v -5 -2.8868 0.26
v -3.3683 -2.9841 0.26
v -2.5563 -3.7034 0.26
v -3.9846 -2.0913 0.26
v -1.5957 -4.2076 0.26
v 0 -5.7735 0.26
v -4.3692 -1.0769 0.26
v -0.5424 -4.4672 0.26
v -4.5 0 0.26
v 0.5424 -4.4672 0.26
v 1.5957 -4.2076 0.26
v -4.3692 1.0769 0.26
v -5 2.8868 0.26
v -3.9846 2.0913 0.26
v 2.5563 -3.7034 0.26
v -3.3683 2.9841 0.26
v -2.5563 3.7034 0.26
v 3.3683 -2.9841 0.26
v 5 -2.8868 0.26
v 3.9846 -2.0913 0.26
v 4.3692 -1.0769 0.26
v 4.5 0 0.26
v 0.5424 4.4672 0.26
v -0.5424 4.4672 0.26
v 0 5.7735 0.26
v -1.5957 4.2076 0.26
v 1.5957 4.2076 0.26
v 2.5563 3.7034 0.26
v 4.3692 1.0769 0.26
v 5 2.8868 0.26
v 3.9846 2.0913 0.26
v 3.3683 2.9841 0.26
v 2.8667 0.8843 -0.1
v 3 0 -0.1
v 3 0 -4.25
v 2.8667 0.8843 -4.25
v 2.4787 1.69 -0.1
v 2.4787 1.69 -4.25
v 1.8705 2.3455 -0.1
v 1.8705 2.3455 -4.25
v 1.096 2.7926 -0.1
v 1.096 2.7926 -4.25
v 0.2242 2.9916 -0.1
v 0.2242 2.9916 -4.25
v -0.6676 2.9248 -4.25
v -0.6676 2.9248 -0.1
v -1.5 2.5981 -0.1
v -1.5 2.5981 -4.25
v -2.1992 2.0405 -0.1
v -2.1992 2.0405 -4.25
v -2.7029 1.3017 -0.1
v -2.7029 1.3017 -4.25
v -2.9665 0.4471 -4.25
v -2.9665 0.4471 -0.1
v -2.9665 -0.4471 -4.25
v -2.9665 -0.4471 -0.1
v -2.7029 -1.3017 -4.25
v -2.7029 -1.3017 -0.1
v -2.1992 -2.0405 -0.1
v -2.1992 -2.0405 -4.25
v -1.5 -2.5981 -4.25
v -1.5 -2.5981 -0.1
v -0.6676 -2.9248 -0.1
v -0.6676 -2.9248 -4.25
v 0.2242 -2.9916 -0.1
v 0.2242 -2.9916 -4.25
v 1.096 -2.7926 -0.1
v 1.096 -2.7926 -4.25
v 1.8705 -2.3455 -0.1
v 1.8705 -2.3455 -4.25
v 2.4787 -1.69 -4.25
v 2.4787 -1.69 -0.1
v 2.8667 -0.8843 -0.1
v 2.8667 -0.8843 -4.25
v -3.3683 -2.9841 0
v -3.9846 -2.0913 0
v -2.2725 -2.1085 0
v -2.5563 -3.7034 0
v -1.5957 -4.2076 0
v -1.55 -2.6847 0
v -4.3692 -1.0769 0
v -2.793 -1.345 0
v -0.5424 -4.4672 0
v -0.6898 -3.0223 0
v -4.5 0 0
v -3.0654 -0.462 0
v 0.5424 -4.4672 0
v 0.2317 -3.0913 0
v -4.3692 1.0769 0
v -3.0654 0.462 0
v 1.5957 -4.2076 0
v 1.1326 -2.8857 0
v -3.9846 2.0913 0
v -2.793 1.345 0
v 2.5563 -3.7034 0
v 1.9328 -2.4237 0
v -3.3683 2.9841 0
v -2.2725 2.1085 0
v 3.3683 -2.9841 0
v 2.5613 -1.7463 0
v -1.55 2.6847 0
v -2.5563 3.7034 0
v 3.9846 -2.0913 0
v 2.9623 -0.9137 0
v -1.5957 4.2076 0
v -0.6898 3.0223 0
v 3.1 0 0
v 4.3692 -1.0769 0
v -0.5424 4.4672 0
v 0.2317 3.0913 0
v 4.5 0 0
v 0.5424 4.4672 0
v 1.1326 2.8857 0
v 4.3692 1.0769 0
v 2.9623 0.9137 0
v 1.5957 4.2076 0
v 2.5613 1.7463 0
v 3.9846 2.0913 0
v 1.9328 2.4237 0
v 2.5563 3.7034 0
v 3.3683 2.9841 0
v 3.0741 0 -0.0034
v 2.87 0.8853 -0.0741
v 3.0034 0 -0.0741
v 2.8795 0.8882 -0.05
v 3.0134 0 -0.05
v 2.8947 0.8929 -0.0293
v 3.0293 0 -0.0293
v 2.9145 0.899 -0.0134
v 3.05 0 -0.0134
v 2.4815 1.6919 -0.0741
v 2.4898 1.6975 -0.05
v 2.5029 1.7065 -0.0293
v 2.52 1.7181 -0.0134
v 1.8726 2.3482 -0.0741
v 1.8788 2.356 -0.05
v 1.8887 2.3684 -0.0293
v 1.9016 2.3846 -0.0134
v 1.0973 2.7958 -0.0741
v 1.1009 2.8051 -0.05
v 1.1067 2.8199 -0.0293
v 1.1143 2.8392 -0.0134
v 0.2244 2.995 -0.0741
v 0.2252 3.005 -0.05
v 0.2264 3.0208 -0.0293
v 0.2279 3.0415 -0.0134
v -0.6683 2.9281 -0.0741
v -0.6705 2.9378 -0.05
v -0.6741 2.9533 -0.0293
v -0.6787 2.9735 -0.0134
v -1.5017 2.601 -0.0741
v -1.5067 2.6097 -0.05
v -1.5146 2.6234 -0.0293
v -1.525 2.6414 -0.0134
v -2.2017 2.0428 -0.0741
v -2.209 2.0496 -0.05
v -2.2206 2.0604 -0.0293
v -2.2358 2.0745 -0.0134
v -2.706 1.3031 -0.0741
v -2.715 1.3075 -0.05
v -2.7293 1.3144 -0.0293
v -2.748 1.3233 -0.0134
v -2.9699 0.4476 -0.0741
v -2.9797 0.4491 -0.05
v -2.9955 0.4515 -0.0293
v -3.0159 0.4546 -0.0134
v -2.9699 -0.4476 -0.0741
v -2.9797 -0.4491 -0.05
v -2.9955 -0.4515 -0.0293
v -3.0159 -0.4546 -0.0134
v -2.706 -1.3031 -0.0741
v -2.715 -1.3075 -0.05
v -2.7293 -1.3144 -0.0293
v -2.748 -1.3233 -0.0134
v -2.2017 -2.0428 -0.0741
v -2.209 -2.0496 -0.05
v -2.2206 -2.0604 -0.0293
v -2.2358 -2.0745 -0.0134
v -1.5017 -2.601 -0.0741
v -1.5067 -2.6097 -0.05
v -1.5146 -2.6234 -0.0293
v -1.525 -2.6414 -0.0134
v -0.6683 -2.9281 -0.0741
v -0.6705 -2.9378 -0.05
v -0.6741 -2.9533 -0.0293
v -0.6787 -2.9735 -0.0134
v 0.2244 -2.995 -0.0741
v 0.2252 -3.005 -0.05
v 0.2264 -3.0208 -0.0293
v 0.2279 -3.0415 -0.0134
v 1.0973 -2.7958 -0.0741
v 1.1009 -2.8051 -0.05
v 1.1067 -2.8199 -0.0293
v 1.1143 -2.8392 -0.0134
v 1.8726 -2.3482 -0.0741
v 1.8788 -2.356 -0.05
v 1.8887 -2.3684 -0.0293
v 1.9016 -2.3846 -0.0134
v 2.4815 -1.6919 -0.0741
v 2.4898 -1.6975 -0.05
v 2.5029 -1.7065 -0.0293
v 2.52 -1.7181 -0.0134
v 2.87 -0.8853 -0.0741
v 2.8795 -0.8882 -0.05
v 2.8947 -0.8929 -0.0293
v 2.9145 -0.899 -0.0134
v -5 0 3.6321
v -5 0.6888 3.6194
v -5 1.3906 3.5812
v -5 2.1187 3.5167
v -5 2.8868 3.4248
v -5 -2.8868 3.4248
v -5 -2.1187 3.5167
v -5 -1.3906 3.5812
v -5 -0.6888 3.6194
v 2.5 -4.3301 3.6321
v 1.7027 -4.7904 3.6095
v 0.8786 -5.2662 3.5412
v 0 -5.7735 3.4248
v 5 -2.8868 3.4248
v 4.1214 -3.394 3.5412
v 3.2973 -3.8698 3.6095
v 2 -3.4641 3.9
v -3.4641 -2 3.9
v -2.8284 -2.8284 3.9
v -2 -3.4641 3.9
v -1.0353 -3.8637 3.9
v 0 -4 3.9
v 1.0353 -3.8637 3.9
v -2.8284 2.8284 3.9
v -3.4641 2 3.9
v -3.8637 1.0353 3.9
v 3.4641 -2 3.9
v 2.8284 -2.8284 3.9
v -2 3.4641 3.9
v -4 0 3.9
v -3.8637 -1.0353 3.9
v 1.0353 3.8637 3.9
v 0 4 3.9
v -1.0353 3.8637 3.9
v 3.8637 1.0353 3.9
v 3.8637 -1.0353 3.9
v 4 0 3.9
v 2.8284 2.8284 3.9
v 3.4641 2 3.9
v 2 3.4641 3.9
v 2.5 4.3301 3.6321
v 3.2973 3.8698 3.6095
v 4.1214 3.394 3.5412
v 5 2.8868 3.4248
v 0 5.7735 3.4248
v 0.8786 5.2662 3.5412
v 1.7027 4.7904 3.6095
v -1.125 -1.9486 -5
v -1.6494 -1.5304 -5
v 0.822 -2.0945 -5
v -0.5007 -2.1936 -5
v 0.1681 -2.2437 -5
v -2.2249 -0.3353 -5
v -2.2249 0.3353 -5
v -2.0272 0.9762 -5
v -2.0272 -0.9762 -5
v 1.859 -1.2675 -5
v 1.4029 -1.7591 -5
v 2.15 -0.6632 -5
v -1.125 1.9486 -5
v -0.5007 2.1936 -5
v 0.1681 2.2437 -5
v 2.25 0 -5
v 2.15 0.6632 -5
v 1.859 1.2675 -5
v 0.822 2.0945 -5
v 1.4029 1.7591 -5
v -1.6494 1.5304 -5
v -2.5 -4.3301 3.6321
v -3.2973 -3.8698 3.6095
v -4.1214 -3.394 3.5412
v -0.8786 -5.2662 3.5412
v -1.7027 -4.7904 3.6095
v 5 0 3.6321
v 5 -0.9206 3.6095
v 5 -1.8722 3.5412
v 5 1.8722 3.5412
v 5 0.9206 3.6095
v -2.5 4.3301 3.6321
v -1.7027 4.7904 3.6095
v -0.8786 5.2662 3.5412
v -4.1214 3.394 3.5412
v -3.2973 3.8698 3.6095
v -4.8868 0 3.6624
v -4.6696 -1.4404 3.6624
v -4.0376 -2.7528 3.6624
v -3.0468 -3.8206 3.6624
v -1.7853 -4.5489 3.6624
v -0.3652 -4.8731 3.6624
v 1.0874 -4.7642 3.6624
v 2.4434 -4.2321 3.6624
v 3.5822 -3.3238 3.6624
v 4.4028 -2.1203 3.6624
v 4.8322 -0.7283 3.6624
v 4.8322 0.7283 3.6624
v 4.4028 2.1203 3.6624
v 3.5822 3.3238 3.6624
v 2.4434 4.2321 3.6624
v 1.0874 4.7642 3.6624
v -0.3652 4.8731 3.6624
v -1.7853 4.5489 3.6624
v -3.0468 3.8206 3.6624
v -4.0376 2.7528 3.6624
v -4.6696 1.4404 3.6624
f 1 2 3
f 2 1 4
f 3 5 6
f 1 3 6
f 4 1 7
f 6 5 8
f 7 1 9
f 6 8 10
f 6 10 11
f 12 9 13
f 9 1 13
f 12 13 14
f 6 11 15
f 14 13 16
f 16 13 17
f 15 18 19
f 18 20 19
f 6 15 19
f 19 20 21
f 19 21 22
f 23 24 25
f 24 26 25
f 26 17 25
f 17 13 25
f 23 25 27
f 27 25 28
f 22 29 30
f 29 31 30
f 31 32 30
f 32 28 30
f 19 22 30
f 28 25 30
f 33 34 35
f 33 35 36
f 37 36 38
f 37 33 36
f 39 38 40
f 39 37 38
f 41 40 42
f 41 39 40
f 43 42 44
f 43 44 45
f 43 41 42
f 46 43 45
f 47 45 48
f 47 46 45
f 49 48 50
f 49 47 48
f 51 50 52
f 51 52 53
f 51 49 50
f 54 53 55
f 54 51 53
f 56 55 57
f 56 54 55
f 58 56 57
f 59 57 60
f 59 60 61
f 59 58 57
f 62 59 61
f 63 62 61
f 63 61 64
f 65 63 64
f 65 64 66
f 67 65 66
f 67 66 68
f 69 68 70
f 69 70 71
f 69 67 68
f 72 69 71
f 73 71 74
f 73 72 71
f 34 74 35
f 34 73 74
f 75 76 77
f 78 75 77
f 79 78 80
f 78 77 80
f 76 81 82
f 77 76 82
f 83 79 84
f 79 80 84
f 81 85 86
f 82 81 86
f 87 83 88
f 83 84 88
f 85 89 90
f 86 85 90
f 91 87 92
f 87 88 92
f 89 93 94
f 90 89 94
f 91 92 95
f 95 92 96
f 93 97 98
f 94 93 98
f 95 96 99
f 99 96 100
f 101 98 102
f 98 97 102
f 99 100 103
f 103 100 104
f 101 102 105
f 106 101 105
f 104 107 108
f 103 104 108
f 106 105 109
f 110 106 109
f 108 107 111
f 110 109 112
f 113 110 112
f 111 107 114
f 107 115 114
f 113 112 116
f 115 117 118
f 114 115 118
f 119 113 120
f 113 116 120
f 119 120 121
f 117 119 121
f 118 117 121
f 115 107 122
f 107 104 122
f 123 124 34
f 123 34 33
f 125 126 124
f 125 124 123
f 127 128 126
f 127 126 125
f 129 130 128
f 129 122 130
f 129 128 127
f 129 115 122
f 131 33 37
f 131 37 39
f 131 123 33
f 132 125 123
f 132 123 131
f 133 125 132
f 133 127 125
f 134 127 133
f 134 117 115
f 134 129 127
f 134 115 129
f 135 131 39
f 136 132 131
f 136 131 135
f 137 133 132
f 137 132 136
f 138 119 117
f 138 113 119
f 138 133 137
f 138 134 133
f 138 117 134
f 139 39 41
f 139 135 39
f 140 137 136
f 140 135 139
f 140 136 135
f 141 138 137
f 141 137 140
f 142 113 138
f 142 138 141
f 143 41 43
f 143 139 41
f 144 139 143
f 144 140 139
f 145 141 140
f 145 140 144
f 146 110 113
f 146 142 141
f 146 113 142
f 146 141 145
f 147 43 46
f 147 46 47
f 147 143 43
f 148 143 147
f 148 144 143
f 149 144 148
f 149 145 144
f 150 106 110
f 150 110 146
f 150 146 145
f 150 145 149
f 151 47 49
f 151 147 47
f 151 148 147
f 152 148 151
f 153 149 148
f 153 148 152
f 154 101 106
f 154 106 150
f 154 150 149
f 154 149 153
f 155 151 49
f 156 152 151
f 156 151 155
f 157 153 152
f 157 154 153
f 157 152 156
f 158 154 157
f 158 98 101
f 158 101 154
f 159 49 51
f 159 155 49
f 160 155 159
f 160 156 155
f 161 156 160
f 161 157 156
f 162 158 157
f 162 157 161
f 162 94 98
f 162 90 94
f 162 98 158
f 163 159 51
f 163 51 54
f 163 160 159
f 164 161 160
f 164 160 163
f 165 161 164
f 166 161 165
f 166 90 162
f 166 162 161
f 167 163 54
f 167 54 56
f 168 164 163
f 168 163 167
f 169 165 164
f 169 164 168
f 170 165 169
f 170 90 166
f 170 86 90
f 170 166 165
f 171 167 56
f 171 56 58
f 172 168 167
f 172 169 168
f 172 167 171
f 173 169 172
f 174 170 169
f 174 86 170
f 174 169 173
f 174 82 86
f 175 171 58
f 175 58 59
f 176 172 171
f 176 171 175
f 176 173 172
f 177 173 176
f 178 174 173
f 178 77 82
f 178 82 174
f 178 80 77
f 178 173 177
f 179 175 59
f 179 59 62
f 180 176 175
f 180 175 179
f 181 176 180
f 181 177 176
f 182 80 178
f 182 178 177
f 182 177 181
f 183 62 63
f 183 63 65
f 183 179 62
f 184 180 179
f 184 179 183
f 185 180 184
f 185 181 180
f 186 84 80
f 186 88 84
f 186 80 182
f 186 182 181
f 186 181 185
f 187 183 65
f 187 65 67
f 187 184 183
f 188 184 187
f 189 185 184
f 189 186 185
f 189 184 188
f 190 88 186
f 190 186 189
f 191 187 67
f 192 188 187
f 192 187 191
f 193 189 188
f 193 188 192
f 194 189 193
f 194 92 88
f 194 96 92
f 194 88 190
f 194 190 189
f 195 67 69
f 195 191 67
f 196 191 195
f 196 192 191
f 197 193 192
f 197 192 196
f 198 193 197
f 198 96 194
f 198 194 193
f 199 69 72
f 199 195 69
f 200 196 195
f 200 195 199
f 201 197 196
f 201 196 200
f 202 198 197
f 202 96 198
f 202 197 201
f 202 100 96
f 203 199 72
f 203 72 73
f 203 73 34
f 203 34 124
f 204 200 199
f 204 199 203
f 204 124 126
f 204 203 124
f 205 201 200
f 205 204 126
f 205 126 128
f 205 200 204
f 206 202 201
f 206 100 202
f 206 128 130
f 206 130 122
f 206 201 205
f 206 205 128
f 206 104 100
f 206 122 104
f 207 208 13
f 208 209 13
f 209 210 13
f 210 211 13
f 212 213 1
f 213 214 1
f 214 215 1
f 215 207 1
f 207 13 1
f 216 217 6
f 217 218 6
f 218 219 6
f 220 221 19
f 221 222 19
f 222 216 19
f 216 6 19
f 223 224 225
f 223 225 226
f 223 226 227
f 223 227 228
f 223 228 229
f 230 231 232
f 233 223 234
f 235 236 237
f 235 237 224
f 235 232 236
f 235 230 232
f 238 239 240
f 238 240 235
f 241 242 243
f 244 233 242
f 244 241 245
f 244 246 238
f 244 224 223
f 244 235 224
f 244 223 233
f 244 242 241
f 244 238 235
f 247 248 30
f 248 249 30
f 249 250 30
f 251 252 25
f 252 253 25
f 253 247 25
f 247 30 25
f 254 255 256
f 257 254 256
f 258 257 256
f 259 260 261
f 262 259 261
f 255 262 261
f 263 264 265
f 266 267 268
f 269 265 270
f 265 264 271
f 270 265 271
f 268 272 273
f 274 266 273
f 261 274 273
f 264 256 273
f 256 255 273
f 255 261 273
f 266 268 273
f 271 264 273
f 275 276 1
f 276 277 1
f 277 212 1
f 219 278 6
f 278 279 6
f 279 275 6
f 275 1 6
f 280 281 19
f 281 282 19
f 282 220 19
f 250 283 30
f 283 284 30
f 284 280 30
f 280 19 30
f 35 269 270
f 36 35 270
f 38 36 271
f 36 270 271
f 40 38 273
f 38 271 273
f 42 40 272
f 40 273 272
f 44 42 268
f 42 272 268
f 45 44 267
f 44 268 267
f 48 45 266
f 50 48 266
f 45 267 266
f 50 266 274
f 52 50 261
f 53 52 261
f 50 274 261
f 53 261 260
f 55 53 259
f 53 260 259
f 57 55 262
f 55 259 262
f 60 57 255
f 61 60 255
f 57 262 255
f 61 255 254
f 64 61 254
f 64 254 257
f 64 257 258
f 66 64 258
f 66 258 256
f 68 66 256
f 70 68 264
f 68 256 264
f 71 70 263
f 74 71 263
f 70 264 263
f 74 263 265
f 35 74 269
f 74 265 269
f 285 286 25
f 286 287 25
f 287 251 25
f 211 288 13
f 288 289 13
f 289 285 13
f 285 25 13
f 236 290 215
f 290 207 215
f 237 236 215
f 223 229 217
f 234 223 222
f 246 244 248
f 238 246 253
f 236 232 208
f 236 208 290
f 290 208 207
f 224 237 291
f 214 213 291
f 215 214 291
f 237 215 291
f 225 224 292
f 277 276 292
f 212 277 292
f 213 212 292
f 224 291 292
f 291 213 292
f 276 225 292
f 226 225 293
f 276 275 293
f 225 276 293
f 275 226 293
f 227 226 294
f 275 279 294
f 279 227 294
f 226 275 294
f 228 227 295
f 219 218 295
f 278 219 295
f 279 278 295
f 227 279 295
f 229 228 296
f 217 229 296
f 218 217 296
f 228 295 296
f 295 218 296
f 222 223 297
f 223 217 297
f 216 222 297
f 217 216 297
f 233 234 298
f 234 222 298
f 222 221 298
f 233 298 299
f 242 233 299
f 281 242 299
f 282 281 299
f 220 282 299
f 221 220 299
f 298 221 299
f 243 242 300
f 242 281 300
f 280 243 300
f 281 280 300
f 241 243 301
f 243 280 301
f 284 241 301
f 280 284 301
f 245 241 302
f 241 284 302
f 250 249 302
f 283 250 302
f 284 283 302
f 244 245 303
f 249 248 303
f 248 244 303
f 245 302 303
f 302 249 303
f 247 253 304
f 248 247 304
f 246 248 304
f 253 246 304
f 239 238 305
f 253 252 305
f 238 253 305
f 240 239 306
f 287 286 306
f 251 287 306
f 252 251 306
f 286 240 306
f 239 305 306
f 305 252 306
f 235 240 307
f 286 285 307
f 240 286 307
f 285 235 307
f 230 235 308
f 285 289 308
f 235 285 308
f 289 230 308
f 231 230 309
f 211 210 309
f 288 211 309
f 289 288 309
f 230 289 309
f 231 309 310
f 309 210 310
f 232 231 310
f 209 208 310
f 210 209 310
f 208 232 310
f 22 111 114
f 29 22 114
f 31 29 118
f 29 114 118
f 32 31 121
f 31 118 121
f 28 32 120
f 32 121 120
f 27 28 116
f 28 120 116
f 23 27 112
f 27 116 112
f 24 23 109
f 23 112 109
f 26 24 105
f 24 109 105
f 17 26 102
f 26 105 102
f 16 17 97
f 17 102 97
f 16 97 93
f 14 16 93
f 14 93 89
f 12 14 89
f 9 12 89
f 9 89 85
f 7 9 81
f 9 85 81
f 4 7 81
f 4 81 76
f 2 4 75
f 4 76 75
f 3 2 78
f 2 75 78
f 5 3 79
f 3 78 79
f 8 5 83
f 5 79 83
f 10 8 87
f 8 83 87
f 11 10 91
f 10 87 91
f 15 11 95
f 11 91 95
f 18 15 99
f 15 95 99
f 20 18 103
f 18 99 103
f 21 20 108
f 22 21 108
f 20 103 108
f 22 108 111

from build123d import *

# Parameters (mm, degrees)
EXTRUDE_1_DEPTH     = 3.9
SKETCH_3_R          = 3
EXTRUDE_3_DEPTH     = 5
CHAMFER_1_SIZE      = 0.75
SKETCH_2_OUTSIDE_W  = 15.536
SKETCH_2_OUTSIDE_H  = 17.084
SKETCH_2_OUTSIDE_R  = 4.5
CUT_EXTRUDE_1_DEPTH = 0.26
FILLET_1_R          = 0.1


with BuildPart() as part:
    # 草图1 → 凸台-拉伸1 (new body)
    with BuildSketch(Plane.XY):
        Polygon((0, 5.773502692), (-5, 2.886751346), (-5, -2.886751346), (0, -5.773502692), (5, -2.886751346), (5, 2.886751346), align=None)
    extrude(amount=EXTRUDE_1_DEPTH)

    # 草图3 → 凸台-拉伸3 (add)
    with BuildSketch(Plane.XY):
        Circle(SKETCH_3_R)
    extrude(amount=-EXTRUDE_3_DEPTH)

    # 草图4 → 切除-旋转1 (revolve, cut)
    with BuildSketch(Plane(origin=(0, 0, 0), x_dir=(0, 0, -1), z_dir=(1, 0, 0))):
        Polygon((-3.9, 20), (-3.9, 4), (0.387187079, 20), align=None)
    revolve(axis=Axis((0, 0, -2.242017917), (0, 0, 1)), mode=Mode.SUBTRACT)

    # 倒角1
    chamfer_1_edges = [part.edges().sort_by_distance(p)[0] for p in [
        (-3, 0, -5),
    ]]
    chamfer(chamfer_1_edges, length=CHAMFER_1_SIZE)

    # 草图2 outside → 切除-拉伸1 (cut)
    with BuildSketch(Plane.XY):
        Rectangle(SKETCH_2_OUTSIDE_W, SKETCH_2_OUTSIDE_H)
        Circle(SKETCH_2_OUTSIDE_R, mode=Mode.SUBTRACT)
    extrude(amount=CUT_EXTRUDE_1_DEPTH, mode=Mode.SUBTRACT)

    # 圆角1
    fillet_1_edges = [part.edges().sort_by_distance(p)[0] for p in [
        (-3, 0, 0),
    ]]
    fillet(fillet_1_edges, radius=FILLET_1_R)


solid = part.part
